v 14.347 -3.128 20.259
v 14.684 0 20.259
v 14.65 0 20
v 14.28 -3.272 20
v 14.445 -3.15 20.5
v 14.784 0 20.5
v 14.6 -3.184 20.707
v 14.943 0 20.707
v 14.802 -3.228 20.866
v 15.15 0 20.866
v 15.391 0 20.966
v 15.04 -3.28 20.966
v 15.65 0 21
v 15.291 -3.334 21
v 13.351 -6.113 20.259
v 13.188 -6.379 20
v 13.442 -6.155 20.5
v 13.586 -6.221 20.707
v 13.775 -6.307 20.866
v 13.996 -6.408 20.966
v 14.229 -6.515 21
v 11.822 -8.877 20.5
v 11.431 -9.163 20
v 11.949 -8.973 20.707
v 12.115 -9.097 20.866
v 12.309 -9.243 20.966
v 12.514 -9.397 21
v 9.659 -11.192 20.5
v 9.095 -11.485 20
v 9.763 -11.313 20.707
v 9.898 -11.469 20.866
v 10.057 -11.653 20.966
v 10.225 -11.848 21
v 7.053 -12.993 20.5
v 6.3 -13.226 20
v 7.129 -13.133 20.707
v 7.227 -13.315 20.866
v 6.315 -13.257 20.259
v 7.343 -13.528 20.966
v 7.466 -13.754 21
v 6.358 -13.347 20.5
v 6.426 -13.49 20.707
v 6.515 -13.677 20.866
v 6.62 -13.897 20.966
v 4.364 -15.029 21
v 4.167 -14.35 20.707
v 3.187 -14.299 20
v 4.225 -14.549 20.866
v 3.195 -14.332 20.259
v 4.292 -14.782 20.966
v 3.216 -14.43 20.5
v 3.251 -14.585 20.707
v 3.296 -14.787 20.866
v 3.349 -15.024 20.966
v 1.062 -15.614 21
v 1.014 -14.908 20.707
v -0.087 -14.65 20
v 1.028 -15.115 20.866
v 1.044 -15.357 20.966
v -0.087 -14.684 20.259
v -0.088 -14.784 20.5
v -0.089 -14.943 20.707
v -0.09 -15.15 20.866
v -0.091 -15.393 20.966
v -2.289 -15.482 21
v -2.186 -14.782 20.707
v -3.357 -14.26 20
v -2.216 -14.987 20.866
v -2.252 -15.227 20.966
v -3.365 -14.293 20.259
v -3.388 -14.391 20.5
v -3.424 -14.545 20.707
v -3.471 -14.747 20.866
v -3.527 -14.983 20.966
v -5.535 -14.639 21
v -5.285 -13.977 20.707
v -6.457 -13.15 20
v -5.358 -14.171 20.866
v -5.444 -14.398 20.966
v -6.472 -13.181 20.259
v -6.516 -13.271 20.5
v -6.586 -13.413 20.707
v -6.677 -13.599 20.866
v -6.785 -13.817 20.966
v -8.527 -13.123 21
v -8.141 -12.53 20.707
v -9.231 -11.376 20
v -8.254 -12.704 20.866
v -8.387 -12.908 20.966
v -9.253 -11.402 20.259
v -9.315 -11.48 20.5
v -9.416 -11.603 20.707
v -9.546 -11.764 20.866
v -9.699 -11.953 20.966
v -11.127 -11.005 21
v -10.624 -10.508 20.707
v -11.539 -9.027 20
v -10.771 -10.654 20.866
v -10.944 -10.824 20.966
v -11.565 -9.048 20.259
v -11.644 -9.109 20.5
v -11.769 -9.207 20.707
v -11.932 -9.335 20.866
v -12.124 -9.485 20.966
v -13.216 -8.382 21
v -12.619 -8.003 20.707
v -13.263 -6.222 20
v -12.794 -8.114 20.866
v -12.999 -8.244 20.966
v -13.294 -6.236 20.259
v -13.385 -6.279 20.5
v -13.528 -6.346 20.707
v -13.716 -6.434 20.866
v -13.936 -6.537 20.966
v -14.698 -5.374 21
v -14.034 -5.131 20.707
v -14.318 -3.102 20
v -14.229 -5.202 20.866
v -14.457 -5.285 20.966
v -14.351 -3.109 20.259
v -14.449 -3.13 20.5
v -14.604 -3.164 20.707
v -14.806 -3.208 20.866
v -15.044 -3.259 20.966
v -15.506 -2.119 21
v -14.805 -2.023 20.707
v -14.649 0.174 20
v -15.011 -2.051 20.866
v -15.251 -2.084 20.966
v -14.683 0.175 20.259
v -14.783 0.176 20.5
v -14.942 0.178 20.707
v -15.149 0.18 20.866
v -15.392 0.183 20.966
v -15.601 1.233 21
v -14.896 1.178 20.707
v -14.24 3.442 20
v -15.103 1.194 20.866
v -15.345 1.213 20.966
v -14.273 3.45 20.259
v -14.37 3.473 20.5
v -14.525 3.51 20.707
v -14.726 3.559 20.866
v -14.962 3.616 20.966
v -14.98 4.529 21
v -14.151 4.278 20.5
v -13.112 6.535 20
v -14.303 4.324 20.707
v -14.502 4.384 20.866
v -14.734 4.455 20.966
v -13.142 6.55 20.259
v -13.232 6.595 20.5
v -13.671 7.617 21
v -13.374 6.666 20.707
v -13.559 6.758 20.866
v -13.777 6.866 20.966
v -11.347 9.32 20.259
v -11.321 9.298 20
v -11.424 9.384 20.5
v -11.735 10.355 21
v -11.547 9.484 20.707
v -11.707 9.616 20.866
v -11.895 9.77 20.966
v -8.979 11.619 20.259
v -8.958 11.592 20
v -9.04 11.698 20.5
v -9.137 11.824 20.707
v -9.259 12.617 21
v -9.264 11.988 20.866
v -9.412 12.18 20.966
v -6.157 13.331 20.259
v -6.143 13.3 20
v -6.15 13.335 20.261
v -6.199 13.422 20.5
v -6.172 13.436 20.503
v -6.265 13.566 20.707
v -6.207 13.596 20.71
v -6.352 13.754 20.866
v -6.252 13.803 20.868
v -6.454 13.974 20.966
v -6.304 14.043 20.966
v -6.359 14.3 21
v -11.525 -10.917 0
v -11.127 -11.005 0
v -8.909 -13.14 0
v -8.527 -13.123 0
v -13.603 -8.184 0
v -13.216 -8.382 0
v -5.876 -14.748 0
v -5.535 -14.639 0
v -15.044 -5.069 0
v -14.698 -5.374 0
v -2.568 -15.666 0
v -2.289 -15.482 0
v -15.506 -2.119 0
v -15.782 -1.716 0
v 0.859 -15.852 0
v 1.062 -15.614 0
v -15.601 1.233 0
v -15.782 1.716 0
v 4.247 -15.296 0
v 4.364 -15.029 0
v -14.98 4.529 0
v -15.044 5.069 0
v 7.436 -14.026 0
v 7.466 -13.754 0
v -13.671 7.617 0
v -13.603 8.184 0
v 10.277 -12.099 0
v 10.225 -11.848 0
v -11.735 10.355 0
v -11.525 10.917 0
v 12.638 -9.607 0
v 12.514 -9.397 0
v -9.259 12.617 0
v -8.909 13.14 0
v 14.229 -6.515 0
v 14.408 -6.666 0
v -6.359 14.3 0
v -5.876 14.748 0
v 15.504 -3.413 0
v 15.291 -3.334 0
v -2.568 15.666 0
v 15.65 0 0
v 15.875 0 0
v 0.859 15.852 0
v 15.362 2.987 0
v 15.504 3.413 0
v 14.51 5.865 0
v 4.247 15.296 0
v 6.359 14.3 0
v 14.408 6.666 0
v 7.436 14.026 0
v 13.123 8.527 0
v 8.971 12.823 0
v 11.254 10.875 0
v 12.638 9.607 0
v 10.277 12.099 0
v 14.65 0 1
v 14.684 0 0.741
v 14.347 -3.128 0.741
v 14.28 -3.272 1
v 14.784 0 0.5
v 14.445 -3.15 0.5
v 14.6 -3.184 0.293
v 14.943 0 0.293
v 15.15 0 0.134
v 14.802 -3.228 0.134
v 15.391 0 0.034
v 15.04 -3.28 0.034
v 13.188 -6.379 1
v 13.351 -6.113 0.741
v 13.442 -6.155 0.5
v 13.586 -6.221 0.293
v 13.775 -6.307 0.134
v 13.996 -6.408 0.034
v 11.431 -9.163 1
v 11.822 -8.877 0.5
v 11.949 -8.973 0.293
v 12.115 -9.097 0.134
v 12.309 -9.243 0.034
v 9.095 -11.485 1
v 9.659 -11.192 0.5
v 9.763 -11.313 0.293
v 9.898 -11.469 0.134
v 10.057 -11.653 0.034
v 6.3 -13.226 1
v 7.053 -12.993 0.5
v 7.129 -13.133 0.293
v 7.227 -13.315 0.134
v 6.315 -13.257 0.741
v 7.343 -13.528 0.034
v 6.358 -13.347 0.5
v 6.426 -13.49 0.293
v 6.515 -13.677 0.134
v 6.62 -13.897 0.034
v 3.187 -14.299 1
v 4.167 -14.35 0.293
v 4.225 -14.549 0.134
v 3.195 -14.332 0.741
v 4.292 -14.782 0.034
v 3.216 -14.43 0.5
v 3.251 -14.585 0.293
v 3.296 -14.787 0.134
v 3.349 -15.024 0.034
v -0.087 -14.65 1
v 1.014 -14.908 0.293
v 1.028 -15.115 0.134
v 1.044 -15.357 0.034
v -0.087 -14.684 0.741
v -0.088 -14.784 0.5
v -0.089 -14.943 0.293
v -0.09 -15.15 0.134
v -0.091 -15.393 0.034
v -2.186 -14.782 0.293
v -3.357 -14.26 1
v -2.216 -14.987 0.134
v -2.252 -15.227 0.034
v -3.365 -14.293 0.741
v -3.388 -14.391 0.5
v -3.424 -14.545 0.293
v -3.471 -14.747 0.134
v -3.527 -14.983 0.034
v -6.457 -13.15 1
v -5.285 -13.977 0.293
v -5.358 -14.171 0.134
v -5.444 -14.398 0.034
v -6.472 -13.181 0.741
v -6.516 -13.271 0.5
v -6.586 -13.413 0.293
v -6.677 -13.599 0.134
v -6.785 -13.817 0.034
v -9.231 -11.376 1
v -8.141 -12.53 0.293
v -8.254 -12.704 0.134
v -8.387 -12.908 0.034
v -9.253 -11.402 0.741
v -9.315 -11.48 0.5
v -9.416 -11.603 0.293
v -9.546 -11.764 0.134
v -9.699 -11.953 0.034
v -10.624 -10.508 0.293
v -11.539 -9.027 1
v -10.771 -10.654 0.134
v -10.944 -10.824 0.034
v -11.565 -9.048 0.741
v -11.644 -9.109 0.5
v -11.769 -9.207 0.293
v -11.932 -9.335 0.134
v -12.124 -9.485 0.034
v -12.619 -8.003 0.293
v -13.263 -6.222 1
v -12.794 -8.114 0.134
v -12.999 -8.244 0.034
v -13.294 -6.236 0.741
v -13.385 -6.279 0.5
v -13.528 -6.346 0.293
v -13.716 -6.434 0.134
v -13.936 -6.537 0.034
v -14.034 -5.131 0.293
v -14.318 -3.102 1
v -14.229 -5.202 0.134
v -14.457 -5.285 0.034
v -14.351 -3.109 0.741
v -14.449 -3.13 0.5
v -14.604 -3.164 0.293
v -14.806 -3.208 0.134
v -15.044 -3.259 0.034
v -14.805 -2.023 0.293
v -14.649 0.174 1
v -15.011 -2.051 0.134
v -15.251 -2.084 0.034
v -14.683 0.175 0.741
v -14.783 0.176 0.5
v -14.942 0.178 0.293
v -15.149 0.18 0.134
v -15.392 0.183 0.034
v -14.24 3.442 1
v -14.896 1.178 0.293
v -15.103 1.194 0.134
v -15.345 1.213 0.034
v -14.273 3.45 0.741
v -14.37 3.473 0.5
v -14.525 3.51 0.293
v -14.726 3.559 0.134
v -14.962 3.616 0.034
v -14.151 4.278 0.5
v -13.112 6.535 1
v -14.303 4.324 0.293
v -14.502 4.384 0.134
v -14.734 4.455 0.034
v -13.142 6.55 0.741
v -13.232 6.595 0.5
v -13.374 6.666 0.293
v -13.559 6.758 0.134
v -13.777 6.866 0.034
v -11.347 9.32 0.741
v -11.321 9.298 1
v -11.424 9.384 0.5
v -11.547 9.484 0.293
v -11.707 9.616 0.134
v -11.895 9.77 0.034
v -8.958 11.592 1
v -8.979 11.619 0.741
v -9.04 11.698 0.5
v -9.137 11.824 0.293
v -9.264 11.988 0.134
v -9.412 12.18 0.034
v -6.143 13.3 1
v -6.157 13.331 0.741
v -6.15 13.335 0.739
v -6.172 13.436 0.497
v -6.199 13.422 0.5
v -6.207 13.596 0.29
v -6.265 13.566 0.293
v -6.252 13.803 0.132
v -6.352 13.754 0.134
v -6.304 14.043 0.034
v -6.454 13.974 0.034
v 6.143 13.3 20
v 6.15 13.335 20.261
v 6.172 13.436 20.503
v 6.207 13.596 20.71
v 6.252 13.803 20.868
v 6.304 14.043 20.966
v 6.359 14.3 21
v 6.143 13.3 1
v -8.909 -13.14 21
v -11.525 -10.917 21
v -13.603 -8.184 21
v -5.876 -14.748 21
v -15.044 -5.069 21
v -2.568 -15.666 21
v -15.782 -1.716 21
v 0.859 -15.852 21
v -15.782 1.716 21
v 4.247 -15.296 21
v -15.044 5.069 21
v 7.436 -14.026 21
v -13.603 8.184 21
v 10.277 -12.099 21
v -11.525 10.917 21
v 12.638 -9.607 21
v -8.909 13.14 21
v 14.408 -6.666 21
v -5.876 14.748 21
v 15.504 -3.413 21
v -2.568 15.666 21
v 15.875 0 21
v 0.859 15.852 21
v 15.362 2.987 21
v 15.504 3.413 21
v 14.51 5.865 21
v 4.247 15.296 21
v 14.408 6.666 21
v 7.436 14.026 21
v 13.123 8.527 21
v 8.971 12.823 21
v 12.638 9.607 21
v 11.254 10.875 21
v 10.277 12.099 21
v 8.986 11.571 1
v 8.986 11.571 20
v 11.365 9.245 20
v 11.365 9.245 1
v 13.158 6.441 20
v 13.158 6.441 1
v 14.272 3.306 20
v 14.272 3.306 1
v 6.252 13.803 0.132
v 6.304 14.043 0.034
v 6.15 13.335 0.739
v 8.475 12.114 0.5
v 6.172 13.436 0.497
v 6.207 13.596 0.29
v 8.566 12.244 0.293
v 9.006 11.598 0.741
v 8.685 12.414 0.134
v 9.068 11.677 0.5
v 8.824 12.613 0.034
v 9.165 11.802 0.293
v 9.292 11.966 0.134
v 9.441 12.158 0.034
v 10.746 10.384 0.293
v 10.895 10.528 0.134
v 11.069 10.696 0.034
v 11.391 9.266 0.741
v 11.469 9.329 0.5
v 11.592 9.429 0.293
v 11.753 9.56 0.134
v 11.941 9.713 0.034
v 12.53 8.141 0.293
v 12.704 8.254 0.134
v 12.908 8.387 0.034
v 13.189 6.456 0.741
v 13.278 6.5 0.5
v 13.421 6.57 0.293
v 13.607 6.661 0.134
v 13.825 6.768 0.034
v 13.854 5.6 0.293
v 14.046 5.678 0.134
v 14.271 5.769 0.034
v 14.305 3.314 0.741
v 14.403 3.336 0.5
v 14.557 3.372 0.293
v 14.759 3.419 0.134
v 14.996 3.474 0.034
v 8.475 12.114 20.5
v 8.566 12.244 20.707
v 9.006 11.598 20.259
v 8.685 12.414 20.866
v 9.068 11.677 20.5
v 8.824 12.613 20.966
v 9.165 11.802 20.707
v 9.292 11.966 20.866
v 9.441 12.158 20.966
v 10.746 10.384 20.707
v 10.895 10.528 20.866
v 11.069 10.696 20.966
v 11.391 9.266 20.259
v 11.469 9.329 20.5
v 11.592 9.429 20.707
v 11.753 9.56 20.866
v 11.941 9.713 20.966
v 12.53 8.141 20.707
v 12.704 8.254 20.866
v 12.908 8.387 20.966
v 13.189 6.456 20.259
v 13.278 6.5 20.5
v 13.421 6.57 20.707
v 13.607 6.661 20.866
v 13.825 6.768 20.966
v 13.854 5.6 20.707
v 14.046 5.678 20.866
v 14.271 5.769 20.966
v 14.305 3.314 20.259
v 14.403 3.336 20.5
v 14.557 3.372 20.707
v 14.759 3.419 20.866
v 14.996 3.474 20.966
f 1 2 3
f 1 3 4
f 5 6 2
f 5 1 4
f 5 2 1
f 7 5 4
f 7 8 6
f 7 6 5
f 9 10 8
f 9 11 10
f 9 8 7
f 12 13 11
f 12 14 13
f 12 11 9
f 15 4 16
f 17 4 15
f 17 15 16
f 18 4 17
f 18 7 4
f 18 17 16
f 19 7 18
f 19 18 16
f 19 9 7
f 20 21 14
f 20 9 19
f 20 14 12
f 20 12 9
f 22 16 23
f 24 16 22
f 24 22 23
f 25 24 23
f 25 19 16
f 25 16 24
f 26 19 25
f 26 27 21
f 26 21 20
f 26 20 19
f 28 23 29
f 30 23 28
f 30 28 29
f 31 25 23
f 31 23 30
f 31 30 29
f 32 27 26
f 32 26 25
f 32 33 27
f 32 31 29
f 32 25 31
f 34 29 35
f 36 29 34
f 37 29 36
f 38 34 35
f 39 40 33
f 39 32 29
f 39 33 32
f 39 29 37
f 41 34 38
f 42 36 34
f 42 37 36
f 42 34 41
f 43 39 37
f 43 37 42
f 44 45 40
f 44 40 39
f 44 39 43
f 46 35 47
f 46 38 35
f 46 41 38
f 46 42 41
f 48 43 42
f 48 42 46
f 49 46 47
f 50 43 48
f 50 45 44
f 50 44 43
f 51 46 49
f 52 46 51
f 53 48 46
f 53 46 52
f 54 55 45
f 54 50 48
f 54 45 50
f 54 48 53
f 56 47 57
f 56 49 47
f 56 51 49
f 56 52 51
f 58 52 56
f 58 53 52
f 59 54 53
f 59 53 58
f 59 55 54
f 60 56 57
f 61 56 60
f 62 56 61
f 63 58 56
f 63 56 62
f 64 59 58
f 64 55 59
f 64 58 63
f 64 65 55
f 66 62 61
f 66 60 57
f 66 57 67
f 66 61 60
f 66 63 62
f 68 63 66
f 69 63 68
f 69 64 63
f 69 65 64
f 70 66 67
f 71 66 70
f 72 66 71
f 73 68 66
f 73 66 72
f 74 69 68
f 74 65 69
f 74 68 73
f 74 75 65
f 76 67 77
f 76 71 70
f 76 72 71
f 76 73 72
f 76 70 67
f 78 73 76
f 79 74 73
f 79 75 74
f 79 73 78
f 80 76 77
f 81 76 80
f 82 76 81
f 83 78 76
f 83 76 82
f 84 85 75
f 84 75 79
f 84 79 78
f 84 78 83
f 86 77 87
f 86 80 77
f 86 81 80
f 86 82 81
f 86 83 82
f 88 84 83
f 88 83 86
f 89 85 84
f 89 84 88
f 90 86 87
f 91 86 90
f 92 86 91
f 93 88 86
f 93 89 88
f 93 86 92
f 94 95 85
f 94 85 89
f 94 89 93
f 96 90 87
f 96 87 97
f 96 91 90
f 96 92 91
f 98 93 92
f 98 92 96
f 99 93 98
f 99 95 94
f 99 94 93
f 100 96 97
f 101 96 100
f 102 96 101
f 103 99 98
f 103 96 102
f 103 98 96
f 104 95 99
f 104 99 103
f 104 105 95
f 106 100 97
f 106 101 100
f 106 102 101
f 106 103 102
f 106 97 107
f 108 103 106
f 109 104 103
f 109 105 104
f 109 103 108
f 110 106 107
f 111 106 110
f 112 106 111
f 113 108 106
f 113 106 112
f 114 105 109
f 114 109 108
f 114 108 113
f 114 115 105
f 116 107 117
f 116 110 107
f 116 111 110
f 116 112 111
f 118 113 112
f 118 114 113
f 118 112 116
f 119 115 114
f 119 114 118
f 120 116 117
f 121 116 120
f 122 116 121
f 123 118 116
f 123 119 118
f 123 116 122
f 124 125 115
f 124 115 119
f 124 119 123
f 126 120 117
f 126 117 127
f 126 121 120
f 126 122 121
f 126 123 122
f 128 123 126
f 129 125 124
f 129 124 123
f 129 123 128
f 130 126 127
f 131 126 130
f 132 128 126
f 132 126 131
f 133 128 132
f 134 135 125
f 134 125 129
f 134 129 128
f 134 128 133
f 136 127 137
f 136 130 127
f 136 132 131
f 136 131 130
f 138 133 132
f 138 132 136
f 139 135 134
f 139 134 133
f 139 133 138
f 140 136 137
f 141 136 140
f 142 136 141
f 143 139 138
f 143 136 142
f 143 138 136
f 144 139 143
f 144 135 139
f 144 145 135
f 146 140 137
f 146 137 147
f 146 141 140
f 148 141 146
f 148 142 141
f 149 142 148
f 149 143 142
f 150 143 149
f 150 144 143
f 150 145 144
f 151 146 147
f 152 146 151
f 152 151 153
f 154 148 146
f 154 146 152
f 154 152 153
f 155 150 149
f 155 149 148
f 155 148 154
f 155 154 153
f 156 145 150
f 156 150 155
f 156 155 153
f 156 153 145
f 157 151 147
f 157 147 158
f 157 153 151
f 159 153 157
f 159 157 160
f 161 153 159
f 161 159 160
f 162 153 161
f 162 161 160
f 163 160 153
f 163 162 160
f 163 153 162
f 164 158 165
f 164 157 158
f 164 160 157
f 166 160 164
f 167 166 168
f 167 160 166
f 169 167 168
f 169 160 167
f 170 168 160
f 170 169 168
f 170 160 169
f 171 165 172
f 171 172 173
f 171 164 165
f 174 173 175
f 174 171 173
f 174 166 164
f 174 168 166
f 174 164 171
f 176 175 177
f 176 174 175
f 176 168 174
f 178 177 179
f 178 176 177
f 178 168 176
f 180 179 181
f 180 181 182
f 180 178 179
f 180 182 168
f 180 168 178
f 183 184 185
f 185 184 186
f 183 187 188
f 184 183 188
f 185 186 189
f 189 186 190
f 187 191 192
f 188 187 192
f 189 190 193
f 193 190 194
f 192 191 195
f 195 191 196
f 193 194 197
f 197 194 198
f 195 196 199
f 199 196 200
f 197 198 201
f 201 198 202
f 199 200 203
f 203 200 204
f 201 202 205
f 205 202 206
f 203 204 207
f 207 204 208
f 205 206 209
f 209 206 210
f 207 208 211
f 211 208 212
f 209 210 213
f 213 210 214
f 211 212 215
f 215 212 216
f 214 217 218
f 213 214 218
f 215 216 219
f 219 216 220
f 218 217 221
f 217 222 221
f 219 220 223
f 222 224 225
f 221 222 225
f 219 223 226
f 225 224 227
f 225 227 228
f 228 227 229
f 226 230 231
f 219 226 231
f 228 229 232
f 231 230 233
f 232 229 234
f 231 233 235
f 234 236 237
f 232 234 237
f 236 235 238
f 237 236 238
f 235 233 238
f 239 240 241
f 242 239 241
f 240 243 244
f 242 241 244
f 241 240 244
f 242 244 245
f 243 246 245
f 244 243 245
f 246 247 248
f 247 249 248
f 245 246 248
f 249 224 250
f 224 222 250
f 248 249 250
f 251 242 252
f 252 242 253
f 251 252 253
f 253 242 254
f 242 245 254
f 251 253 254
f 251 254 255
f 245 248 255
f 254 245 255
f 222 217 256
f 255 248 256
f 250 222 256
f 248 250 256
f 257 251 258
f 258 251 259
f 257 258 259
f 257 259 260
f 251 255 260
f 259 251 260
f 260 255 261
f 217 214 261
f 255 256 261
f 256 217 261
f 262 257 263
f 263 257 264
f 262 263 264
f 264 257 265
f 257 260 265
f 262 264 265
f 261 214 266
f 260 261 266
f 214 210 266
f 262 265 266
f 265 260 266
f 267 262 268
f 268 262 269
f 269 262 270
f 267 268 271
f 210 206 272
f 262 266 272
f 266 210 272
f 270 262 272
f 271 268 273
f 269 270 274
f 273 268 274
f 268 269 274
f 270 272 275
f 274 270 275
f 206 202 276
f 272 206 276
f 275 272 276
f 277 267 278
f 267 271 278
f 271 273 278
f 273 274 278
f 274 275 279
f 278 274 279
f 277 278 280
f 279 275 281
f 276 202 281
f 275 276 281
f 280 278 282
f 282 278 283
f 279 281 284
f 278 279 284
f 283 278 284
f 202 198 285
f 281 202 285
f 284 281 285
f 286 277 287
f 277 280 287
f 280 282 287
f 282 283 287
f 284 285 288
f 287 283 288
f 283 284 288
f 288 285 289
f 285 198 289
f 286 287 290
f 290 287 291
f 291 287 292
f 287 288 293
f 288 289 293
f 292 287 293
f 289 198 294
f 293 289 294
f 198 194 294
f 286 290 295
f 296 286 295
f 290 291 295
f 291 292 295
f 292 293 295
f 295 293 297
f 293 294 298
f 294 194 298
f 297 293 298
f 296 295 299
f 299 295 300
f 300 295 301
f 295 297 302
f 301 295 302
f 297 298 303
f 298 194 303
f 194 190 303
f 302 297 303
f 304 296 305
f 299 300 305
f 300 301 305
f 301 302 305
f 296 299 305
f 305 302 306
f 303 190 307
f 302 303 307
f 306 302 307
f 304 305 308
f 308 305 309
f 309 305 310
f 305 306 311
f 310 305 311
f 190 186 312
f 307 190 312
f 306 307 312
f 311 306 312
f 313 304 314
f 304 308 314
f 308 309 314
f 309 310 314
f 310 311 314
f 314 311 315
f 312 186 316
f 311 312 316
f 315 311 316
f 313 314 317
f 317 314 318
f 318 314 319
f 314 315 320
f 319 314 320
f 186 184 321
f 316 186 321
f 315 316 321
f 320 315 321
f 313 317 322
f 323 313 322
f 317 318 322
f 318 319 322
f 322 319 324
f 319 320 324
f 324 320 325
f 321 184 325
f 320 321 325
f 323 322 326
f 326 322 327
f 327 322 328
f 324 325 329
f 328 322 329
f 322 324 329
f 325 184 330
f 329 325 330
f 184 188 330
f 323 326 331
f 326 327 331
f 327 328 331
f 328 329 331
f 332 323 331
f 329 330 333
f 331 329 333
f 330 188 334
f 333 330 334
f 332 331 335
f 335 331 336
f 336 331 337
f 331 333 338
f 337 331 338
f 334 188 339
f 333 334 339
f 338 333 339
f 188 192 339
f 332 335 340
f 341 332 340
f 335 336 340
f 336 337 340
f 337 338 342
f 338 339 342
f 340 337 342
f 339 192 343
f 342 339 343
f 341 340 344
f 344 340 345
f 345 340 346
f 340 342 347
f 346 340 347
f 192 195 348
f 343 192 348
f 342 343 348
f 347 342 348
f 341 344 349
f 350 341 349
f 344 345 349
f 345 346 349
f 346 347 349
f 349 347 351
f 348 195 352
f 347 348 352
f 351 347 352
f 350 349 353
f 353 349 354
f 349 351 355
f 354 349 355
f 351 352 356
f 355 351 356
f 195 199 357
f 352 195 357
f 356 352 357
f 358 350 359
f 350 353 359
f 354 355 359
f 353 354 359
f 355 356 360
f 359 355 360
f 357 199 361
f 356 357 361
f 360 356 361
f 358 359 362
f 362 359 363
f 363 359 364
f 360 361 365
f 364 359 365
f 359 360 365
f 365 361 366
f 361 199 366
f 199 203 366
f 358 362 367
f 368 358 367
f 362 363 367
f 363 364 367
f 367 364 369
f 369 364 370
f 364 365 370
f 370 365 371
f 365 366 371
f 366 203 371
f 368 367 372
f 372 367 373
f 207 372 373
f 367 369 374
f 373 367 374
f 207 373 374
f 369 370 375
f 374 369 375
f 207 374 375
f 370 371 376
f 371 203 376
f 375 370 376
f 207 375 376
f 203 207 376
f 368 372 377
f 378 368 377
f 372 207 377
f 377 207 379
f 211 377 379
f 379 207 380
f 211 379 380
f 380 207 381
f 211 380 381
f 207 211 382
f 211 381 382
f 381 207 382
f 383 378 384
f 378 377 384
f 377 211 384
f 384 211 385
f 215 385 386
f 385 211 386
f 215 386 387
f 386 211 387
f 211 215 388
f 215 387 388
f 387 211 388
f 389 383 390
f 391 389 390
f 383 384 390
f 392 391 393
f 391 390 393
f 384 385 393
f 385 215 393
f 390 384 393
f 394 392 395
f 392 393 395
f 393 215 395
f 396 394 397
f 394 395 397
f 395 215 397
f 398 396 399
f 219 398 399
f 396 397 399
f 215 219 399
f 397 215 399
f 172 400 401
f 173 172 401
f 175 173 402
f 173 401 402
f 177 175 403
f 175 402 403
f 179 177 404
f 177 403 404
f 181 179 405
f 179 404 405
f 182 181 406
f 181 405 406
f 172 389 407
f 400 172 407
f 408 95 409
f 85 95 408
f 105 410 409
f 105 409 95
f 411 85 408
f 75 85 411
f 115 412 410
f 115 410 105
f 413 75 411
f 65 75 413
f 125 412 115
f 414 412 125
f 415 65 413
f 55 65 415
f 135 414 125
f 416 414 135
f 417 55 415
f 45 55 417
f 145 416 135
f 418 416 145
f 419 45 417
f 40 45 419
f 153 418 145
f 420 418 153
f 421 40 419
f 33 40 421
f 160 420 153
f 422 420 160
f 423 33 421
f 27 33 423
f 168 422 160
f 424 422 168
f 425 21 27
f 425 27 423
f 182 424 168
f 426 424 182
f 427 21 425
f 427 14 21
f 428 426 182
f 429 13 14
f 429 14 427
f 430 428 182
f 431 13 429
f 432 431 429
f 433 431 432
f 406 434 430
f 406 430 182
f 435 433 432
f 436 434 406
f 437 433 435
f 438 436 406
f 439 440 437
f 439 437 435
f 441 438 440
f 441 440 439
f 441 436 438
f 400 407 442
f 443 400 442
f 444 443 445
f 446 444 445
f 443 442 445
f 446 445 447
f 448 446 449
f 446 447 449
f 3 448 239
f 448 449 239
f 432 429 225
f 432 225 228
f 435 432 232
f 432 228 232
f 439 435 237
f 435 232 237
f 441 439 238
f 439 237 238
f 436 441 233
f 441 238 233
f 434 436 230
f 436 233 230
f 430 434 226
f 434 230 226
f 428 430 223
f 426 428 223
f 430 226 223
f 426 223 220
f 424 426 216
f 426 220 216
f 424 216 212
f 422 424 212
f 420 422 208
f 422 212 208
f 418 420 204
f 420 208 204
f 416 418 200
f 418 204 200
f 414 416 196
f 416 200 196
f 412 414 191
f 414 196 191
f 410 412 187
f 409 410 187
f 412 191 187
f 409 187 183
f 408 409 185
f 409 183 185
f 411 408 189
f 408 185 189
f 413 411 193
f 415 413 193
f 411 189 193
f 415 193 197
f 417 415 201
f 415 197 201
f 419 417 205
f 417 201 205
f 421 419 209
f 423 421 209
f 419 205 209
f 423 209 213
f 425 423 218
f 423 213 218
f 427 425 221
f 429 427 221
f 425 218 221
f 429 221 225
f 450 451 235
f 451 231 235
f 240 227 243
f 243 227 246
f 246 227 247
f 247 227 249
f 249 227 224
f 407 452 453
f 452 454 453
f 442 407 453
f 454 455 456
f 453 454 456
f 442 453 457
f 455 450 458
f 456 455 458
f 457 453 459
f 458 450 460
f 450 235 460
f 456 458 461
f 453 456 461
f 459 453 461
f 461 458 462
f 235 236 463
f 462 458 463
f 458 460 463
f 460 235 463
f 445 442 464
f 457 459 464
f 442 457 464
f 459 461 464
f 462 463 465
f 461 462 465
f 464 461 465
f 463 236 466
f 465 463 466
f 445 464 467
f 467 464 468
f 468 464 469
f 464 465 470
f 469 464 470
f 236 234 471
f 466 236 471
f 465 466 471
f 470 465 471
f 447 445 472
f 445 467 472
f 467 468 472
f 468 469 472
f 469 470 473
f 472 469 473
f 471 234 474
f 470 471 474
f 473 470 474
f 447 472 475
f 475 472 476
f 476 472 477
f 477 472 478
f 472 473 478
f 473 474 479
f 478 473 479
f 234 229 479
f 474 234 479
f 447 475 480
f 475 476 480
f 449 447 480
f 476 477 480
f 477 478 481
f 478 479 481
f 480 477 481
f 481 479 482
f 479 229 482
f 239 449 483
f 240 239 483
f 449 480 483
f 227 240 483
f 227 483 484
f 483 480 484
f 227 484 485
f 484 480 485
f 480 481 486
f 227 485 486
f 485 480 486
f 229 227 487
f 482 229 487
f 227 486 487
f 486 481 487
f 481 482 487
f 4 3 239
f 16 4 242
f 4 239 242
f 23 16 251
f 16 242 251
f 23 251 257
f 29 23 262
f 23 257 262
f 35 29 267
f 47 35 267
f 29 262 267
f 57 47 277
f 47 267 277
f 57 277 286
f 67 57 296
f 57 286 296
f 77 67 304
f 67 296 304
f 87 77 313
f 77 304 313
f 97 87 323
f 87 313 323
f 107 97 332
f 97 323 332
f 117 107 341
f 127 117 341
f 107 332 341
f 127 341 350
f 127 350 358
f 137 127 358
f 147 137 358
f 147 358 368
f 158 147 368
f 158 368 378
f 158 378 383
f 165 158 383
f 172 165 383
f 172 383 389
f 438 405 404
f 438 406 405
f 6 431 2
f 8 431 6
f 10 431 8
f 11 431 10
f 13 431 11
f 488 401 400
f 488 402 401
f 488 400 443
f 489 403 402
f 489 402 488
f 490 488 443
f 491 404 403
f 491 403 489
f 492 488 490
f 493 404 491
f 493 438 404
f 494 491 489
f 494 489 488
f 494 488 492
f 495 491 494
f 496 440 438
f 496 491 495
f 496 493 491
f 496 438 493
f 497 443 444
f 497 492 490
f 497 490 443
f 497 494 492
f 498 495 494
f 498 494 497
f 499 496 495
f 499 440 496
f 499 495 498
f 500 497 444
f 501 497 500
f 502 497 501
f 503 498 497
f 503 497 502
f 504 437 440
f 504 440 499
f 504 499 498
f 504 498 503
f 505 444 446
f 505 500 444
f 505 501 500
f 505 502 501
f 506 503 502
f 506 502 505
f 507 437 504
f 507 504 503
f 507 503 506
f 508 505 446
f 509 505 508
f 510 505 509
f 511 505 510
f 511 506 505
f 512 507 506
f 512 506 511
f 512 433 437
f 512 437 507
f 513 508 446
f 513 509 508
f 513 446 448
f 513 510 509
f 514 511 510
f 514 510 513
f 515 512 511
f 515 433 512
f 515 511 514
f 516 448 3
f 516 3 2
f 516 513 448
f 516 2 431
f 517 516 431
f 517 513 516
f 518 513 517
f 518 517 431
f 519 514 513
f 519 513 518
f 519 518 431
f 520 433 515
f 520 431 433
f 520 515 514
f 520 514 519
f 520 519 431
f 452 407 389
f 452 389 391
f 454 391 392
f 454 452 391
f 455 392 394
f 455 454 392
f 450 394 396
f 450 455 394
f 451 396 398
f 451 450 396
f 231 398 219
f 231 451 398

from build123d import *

# Parameters (mm, degrees)
F0_R     = 15.875
F1_DEPTH = 21
F2_R     = 1


# Not quite as in the source:
# - a feature names something its author has since deleted; it is built from what else it names


with BuildPart() as f1:
    # F0 (on Top) → F1 (new body)
    with BuildSketch(Plane.XY):
        Circle(F0_R)
        with BuildLine():
            ThreePointArc((6.1426785688, 13.3), (12.3412467165, 7.8940565924), (14.65, 0))
            ThreePointArc((14.65, 0), (-7.8940565924, -12.3412467165), (-6.1426785688, 13.3))
            ThreePointArc((-6.1426785688, 13.3), (0, 14.65), (6.1426785688, 13.3))
        make_face(mode=Mode.SUBTRACT)
        with BuildLine():
            Line((-6.1426785688, 13.3), (6.1426785688, 13.3))
            ThreePointArc((6.1426785688, 13.3), (0, 14.65), (-6.1426785688, 13.3))
        make_face()
    extrude(amount=F1_DEPTH)

    # F2
    f2_edges = [f1.edges().sort_by_distance(p)[0] for p in [
        (0, -14.65, 21),
        (0, 13.3, 21),
        (0, -14.65, 0),
        (0, 13.3, 0),
    ]]
    fillet(f2_edges, radius=F2_R)


solid = f1.part
